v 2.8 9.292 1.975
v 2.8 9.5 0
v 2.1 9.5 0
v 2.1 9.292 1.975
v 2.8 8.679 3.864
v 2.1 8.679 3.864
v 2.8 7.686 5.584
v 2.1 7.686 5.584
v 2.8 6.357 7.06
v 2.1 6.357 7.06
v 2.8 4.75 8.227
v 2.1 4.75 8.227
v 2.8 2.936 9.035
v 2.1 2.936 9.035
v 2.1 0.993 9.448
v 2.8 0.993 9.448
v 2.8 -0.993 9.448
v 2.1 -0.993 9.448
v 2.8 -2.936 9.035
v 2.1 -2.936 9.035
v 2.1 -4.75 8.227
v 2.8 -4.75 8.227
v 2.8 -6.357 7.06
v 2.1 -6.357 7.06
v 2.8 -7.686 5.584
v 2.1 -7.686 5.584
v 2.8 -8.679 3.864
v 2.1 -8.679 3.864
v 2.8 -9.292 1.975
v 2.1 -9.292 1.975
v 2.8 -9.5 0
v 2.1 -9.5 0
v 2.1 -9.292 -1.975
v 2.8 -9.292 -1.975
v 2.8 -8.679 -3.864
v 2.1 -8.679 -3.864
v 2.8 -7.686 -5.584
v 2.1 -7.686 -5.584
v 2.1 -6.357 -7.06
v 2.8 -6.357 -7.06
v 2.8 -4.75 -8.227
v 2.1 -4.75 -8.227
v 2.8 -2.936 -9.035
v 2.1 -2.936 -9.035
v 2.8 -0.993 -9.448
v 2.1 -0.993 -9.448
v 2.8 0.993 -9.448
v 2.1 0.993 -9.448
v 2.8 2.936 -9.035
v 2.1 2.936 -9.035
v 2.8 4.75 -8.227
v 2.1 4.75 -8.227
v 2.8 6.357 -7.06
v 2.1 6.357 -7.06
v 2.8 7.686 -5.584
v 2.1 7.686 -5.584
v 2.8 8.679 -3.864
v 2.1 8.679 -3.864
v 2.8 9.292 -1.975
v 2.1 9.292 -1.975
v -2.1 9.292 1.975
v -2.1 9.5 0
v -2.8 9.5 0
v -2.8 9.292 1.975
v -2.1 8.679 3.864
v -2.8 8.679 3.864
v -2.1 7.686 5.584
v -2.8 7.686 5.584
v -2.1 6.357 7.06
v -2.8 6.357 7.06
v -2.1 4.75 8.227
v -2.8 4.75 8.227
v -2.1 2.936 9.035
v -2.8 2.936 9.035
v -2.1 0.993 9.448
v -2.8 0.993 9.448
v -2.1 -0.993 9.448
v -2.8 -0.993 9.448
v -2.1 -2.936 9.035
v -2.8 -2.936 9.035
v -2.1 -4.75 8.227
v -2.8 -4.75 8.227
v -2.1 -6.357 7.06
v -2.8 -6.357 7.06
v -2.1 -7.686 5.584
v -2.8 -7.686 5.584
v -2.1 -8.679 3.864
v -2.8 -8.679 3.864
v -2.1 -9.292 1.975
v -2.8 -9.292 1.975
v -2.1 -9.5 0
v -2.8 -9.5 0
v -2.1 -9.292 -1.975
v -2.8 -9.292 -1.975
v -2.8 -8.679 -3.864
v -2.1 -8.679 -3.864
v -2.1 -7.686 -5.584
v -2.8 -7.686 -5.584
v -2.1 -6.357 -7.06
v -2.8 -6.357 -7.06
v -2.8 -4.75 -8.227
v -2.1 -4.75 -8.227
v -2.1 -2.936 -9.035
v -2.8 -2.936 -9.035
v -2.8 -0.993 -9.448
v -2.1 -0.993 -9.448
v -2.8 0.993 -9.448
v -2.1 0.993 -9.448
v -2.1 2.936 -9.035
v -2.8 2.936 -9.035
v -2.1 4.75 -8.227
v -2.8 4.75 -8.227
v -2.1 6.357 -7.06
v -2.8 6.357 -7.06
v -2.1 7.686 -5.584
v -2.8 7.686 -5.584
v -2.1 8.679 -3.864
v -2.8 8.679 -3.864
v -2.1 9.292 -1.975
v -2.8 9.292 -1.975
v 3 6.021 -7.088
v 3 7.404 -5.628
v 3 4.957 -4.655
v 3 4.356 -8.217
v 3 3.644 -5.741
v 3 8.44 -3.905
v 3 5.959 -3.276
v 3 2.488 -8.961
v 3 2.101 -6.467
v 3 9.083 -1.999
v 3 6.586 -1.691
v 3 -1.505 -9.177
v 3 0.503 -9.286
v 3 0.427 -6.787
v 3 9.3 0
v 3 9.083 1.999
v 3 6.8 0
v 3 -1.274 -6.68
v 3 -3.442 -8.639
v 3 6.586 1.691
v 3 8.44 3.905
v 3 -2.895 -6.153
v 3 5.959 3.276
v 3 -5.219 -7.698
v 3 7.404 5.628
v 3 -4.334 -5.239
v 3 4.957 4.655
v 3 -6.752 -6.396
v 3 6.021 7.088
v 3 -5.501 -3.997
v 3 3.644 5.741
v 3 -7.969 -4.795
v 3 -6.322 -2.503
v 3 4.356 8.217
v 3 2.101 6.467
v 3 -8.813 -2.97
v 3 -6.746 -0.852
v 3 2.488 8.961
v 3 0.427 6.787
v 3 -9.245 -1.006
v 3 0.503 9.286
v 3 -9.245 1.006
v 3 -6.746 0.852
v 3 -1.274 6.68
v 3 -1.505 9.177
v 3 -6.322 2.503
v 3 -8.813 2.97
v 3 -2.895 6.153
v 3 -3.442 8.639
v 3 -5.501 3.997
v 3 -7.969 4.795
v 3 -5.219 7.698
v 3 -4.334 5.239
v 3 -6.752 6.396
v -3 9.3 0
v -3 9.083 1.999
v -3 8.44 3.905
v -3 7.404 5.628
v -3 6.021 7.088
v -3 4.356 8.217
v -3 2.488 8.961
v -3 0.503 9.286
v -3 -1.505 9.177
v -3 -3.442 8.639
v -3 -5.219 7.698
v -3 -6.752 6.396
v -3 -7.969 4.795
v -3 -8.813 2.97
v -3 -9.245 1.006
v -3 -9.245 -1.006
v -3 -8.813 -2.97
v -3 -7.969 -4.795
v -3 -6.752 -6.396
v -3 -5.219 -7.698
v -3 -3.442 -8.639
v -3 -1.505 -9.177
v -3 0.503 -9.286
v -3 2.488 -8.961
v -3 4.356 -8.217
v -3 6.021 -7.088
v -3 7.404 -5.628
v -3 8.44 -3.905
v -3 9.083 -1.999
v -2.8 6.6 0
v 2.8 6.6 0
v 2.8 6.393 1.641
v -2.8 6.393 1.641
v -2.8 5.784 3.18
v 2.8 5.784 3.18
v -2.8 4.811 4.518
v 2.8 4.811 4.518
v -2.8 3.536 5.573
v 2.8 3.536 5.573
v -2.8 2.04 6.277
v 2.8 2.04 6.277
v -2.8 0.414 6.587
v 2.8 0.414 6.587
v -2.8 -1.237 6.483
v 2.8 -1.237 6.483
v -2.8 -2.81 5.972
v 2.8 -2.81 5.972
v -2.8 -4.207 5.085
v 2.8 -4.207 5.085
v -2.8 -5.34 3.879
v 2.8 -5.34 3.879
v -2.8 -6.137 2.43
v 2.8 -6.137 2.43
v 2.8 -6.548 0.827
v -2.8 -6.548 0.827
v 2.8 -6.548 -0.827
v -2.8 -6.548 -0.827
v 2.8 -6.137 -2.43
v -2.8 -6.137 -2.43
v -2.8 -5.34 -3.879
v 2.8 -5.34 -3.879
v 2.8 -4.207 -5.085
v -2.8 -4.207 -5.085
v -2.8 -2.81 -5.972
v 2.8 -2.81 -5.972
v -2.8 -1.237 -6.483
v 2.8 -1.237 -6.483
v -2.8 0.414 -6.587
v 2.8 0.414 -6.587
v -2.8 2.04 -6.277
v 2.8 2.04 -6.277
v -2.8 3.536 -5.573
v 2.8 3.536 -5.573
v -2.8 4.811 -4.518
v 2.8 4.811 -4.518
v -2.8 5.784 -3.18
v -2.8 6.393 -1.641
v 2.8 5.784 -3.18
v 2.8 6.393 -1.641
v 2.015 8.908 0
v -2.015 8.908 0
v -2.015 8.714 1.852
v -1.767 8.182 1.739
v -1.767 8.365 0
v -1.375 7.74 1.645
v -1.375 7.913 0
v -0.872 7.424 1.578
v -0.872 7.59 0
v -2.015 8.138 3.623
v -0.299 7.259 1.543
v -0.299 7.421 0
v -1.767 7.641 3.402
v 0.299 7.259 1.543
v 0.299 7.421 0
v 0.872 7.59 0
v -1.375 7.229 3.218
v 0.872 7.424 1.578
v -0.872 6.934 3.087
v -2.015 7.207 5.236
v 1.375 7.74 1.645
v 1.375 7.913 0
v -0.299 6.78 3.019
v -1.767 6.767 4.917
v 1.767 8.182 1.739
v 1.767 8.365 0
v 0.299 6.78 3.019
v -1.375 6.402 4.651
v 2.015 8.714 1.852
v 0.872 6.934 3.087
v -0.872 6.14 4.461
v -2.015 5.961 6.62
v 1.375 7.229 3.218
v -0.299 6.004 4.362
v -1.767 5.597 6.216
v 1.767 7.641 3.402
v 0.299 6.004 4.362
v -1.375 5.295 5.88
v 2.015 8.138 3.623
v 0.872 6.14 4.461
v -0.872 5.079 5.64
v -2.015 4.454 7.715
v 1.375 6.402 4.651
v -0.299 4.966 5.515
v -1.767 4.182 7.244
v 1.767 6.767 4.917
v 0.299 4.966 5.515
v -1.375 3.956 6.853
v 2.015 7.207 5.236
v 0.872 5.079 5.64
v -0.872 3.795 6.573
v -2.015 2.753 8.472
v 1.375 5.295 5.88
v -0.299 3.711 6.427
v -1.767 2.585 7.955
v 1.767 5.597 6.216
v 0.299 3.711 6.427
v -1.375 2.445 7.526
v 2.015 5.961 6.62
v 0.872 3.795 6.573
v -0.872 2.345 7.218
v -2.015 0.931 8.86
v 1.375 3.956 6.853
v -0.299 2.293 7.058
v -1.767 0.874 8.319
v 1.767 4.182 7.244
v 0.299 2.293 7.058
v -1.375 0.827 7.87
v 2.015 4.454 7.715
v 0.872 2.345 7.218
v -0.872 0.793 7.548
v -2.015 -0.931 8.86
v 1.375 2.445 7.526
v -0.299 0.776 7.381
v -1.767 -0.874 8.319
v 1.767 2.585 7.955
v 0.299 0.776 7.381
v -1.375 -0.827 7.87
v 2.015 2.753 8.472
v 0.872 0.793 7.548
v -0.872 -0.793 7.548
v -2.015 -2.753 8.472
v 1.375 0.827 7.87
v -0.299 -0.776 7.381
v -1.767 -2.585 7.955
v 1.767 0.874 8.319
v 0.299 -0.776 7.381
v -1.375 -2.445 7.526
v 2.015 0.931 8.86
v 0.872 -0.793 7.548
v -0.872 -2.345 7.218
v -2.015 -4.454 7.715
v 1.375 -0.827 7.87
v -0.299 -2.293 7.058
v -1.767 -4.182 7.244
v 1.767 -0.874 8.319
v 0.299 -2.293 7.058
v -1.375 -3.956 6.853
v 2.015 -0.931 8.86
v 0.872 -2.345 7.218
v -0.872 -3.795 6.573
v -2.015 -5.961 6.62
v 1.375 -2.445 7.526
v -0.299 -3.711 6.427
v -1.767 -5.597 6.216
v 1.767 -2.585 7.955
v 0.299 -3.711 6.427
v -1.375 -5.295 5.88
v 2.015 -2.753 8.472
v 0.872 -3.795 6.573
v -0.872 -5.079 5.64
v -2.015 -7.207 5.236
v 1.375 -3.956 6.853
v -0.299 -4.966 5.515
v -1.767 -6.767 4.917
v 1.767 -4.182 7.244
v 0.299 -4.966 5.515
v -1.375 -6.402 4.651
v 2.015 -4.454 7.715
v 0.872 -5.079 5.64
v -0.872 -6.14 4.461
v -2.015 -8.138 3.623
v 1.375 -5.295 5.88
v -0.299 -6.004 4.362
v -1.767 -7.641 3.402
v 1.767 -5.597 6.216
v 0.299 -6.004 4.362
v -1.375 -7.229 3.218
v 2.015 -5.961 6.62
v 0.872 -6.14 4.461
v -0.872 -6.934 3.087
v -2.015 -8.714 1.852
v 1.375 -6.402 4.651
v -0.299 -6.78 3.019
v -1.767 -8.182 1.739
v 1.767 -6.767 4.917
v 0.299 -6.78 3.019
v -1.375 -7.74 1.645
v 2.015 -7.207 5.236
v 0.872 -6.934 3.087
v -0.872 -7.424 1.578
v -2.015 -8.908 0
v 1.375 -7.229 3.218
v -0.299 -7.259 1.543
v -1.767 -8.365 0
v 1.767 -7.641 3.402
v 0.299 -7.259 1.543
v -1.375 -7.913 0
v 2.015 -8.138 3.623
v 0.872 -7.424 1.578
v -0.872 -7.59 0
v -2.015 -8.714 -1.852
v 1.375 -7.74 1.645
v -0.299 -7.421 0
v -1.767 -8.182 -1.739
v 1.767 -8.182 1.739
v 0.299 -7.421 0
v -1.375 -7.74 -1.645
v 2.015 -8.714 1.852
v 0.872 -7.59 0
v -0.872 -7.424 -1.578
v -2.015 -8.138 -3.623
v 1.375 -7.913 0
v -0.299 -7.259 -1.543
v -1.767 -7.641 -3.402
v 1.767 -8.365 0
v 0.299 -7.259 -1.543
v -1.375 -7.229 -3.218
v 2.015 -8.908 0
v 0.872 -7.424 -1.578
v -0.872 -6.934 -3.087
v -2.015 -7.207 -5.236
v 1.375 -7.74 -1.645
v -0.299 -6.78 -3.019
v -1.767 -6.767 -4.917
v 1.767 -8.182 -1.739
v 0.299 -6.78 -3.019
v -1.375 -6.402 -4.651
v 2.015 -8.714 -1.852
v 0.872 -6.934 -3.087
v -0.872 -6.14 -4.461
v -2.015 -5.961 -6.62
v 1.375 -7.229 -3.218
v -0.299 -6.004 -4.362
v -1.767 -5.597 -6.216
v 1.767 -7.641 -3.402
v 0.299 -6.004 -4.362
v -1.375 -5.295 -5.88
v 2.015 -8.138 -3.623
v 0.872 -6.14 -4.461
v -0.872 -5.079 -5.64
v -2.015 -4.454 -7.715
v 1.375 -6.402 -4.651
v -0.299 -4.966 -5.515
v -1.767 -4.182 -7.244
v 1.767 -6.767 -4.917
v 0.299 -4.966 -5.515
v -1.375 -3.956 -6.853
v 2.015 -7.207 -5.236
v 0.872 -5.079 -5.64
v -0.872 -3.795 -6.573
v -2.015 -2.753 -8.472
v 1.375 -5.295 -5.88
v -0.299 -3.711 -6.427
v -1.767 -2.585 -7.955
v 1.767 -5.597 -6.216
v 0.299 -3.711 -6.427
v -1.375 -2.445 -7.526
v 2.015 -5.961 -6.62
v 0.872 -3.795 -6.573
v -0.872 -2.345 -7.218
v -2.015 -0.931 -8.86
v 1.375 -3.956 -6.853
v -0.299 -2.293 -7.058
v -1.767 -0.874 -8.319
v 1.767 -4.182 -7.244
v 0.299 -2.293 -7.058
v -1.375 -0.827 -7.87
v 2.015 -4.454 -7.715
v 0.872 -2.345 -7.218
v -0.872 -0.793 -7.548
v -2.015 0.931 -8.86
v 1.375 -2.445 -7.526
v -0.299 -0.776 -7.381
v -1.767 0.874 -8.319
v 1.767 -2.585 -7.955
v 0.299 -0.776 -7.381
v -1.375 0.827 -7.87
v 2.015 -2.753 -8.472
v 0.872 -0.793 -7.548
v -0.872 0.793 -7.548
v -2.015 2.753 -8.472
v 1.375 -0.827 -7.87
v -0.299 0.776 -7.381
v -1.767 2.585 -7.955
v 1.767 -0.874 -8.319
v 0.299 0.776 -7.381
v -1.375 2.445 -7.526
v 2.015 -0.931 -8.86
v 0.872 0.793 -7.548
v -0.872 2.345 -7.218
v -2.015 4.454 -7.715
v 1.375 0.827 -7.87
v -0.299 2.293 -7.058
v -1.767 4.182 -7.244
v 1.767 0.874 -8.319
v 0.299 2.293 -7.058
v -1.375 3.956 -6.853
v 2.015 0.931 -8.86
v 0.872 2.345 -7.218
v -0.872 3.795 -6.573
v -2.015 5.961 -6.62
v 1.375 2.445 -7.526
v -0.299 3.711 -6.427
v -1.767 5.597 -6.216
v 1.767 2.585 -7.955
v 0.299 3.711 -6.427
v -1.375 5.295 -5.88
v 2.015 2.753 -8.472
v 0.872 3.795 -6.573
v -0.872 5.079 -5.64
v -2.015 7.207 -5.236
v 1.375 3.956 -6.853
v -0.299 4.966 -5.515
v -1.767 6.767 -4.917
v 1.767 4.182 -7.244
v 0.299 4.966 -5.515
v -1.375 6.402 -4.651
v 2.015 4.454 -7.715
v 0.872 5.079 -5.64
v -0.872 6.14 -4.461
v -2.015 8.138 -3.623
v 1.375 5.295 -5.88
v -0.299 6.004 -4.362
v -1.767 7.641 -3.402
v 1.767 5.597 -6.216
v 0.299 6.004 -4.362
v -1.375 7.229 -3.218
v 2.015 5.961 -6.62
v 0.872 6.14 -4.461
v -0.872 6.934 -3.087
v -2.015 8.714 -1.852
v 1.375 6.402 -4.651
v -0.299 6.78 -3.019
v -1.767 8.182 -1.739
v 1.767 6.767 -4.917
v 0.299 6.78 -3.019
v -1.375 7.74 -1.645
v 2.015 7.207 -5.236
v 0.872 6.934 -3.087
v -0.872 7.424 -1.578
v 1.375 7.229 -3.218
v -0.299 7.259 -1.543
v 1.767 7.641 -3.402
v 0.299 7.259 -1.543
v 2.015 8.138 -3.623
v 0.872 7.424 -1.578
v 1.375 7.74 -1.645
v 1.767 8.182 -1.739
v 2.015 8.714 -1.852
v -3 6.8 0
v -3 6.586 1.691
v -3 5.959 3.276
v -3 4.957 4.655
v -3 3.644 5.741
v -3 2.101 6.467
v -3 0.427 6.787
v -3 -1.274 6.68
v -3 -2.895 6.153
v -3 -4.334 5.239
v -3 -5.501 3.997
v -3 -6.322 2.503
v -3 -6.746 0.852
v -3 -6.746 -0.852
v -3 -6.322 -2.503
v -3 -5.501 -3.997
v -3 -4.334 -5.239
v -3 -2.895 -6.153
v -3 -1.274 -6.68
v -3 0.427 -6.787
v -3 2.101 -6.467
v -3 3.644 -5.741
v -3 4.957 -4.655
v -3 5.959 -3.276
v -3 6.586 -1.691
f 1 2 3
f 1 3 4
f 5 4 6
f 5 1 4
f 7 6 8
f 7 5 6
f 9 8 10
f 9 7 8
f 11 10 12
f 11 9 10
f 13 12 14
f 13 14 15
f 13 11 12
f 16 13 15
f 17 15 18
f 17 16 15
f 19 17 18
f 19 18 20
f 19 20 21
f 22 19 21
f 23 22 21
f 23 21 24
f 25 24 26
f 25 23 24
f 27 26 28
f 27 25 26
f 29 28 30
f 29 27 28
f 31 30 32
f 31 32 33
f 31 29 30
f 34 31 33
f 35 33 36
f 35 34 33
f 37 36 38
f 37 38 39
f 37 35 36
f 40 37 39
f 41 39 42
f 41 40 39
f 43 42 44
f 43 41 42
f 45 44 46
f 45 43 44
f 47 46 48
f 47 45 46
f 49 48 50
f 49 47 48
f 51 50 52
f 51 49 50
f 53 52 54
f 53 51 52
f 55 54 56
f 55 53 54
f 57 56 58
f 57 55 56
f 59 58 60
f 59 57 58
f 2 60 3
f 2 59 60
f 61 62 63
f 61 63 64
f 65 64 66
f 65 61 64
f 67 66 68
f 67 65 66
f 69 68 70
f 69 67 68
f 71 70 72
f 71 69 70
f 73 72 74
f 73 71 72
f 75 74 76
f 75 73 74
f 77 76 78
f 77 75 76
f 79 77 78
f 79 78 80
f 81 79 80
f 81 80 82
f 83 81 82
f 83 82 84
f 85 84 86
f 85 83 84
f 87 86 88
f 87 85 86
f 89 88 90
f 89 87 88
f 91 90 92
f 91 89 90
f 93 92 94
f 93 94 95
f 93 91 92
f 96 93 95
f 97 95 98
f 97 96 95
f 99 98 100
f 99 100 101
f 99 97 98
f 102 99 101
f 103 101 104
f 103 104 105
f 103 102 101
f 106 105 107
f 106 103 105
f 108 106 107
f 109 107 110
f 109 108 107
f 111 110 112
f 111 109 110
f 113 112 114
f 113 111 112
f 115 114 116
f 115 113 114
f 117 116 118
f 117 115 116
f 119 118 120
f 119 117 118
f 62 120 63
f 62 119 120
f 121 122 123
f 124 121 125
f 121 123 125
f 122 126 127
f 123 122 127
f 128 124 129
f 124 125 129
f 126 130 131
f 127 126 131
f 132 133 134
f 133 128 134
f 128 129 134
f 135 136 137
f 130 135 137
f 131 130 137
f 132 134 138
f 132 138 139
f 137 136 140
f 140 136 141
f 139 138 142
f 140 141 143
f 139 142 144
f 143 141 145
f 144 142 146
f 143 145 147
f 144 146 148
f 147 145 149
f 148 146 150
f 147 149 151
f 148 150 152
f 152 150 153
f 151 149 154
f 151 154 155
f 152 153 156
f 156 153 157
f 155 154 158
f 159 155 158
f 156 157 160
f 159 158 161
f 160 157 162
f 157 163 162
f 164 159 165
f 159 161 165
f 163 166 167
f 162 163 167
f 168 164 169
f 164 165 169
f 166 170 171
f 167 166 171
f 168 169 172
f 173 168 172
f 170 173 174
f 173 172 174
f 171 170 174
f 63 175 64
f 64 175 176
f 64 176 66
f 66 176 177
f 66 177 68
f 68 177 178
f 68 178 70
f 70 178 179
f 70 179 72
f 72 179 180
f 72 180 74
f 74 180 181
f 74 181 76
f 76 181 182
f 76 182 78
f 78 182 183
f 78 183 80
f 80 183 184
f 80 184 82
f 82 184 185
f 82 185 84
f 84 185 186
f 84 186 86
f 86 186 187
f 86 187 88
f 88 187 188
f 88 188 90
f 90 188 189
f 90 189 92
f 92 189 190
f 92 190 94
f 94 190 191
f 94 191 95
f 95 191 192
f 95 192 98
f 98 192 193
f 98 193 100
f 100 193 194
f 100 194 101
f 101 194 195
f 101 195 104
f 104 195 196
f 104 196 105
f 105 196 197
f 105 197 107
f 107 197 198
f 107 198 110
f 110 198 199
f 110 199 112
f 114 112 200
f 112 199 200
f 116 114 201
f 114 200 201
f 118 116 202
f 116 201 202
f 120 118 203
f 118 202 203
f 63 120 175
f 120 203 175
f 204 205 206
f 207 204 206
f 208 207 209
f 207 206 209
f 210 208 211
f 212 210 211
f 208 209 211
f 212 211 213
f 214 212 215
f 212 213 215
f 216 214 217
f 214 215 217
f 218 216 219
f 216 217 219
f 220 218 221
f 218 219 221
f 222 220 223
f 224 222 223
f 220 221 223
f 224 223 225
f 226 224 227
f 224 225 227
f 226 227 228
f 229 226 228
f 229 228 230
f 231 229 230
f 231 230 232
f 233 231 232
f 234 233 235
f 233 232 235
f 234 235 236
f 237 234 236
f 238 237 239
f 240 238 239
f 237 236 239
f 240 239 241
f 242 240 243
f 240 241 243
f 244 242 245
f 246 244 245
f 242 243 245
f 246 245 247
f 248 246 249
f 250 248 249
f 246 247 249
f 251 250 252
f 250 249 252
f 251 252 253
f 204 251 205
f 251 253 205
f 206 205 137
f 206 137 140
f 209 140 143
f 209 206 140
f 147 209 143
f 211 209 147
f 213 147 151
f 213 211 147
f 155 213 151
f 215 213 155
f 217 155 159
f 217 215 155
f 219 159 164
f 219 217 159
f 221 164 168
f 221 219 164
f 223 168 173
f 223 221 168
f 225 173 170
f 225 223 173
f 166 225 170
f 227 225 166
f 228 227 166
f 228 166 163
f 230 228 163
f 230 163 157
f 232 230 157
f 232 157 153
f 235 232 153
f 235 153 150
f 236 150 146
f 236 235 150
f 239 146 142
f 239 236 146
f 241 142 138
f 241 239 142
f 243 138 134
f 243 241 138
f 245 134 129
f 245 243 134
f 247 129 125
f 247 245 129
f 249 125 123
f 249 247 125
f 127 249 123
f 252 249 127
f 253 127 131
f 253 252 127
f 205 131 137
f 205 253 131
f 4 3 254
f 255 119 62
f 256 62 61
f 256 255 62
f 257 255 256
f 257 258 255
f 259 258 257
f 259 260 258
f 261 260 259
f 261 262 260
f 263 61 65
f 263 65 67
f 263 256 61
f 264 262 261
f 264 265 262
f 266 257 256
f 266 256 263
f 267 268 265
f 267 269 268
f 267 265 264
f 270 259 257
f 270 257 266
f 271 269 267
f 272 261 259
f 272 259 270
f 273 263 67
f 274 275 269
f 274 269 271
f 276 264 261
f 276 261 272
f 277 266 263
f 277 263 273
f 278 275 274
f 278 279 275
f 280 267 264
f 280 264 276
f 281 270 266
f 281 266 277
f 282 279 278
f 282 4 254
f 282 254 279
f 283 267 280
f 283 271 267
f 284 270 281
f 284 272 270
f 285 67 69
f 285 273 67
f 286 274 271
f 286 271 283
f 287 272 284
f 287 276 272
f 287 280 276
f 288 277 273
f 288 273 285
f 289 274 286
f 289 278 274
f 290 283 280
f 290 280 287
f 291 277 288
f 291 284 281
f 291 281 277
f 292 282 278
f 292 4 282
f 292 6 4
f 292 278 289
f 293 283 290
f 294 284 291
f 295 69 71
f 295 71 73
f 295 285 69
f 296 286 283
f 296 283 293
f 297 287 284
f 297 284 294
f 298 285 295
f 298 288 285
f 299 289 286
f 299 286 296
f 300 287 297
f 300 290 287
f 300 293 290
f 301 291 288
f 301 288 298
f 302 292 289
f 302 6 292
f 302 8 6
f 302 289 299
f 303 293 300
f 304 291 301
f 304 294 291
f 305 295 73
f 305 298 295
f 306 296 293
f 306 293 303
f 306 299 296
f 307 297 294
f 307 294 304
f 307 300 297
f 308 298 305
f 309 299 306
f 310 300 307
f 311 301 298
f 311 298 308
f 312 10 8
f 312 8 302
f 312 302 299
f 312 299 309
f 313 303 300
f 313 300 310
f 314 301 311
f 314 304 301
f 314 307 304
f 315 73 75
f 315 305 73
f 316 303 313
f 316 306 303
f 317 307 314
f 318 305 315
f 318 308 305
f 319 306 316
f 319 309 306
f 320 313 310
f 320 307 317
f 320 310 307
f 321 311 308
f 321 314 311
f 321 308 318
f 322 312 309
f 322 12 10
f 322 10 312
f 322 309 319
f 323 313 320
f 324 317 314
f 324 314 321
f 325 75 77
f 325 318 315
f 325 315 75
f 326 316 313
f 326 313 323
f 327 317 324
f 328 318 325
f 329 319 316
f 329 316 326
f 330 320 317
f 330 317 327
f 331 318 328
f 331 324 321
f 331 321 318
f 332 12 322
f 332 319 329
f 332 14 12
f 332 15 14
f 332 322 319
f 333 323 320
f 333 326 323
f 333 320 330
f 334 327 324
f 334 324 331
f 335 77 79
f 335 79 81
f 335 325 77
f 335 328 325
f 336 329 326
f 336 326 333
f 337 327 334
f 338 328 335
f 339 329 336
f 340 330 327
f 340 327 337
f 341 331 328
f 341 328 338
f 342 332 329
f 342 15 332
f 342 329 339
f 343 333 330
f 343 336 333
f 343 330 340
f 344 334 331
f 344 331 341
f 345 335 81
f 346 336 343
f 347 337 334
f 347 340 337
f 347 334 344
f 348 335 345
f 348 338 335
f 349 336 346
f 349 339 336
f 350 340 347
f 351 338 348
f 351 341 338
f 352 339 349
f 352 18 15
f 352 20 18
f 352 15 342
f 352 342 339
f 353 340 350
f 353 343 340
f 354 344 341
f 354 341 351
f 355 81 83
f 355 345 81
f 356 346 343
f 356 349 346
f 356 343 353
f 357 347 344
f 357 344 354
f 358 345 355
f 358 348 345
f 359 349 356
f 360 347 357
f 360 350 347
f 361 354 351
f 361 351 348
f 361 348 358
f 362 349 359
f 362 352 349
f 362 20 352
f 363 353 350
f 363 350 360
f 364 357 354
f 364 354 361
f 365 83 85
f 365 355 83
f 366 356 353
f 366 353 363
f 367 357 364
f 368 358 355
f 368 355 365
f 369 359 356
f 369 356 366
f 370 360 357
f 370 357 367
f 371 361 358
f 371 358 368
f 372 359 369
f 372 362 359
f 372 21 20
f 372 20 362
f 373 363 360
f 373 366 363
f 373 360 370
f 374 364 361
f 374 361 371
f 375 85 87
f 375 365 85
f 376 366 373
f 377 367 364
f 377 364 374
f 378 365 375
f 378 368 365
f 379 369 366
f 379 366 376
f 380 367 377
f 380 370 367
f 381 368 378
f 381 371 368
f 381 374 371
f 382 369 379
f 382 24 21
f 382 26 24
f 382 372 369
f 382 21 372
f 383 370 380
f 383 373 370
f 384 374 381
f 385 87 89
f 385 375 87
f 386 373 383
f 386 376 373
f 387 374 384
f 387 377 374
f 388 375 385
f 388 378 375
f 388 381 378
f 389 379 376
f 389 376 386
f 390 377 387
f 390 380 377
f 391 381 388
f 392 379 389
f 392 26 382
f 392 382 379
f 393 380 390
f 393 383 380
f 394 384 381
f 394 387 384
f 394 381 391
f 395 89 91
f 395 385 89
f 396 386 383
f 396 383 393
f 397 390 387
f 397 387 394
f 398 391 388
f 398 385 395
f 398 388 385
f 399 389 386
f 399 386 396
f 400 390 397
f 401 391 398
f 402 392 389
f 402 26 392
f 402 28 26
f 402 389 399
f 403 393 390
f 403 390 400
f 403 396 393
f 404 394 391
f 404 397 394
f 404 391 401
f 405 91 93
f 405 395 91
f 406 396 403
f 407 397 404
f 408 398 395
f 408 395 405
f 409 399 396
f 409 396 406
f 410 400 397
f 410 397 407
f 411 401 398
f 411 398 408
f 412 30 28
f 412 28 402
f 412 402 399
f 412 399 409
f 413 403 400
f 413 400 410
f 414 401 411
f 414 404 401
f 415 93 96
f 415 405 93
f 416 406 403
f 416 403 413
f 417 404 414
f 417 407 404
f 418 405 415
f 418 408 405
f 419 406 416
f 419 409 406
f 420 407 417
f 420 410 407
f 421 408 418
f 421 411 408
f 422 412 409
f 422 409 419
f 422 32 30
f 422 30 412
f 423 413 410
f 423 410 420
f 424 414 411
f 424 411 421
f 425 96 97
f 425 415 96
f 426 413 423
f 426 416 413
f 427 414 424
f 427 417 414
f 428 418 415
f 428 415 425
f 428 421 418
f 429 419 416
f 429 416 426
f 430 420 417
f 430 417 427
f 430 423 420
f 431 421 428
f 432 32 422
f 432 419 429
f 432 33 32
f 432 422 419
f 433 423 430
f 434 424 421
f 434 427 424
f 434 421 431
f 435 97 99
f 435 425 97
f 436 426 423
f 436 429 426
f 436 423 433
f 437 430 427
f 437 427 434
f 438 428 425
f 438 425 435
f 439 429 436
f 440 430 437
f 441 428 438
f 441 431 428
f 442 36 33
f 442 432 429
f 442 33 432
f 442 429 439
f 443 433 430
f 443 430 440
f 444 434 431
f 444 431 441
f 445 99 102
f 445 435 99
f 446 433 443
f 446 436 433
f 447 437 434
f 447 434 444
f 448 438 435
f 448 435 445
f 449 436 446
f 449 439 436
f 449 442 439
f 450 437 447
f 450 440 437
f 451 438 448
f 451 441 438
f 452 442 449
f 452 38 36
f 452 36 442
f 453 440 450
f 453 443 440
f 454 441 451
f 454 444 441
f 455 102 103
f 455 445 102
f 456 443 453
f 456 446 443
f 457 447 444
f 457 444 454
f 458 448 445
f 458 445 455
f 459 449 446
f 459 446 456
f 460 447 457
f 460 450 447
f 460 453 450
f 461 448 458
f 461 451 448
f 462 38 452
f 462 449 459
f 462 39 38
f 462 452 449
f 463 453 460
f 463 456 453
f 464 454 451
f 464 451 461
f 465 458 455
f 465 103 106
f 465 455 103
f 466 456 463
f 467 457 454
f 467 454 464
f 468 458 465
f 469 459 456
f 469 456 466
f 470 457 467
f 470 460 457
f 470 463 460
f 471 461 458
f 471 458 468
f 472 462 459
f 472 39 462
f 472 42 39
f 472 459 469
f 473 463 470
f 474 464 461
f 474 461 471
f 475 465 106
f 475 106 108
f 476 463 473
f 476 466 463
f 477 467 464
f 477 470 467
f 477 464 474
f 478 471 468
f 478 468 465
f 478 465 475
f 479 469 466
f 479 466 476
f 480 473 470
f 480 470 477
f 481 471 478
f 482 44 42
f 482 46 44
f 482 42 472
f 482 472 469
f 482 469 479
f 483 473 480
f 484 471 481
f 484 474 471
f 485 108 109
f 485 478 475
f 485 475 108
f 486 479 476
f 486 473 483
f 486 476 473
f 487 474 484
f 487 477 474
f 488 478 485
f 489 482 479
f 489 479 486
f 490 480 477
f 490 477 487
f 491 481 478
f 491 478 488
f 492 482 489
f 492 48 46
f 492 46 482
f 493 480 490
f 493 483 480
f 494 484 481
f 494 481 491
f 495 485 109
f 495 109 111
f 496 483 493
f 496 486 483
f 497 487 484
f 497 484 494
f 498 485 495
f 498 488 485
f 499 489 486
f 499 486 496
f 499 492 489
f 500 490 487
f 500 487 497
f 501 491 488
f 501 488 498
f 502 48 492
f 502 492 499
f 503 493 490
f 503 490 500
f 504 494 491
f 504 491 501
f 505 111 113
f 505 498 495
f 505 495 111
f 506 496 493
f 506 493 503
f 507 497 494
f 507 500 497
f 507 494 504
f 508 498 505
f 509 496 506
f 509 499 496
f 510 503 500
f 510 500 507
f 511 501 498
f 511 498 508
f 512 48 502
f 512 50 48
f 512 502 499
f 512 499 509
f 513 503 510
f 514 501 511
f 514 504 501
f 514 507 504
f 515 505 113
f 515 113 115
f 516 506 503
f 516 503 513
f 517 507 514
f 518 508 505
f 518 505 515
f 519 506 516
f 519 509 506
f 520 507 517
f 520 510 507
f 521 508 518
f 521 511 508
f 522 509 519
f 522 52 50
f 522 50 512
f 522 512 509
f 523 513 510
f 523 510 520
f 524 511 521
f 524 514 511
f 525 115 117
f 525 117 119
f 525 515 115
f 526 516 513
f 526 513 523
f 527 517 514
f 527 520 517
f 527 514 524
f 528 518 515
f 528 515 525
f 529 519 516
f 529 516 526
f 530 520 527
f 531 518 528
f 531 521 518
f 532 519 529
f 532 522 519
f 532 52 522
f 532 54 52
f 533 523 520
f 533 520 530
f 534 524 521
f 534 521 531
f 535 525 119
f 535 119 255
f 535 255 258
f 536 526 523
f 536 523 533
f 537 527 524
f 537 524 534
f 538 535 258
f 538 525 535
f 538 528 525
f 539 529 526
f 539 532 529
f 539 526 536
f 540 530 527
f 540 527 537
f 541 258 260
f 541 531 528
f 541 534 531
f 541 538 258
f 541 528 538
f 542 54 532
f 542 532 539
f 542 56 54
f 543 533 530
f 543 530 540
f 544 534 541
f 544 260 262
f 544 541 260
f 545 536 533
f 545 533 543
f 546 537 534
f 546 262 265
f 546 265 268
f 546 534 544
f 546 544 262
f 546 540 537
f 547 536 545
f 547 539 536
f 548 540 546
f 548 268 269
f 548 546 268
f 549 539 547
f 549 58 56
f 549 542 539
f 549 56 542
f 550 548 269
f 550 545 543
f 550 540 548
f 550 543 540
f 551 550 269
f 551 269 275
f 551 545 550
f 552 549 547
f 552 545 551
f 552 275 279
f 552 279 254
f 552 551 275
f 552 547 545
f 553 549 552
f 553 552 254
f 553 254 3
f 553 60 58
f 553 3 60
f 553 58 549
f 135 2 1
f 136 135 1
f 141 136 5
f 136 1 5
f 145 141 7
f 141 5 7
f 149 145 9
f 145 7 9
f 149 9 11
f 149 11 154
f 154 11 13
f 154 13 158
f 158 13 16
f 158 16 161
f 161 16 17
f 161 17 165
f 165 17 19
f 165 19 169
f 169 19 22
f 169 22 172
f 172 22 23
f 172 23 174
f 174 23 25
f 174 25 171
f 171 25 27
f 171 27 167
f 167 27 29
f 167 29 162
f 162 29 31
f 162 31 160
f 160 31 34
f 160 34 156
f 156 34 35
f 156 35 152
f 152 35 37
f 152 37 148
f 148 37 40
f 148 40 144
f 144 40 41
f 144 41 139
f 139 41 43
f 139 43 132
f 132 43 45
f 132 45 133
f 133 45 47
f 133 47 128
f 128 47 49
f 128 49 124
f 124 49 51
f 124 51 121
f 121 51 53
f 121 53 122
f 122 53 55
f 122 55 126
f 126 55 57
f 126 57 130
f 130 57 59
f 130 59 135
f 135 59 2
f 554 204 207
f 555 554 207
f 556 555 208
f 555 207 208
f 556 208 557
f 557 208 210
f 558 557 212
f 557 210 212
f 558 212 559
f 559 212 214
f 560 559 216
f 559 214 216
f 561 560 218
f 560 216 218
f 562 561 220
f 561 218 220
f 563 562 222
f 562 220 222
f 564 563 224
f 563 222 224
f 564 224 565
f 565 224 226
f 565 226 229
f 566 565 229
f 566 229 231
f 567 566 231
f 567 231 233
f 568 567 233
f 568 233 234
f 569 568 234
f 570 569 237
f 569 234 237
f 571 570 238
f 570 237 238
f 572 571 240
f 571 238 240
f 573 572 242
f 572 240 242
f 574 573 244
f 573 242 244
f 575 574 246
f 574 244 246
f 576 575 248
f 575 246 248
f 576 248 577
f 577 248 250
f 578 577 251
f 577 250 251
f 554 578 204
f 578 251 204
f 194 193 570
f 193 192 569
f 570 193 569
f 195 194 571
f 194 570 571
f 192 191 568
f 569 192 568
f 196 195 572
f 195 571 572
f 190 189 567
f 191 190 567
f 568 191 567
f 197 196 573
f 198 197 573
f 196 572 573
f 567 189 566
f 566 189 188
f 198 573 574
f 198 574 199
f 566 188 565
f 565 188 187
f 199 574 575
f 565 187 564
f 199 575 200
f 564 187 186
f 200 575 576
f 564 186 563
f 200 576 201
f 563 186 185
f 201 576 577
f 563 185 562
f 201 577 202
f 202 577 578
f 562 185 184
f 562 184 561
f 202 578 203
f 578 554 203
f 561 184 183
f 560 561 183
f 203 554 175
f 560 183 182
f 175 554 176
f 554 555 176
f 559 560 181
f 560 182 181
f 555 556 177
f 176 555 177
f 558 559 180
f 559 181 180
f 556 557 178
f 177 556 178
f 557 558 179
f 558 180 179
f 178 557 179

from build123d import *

# Parameters (mm, degrees)
CHAMFER_SIZE = 0.2


with BuildPart() as part:
    # Sketch → Revolution (revolve)
    with BuildSketch(Plane.XY):
        with BuildLine():
            Line((3, 6.6), (3, 9.5))
            Line((2.1, 9.5), (3, 9.5))
            ThreePointArc((-2.1, 9.5), (0, 7.4), (2.1, 9.5))
            Line((-3, 9.5), (-2.1, 9.5))
            Line((-3, 9.5), (-3, 6.6))
            Line((-3, 6.6), (3, 6.6))
        make_face()
    revolve(axis=Axis((0, 0, 0), (1, 0, 0)))

    # Chamfer
    chamfer_edges = [part.edges().sort_by_distance(p)[0] for p in [
        (-3, -6.6, 0),
        (-3, -9.5, 0),
        (3, -9.5, 0),
        (3, -6.6, 0),
    ]]
    chamfer(chamfer_edges, length=CHAMFER_SIZE)


solid = part.part
